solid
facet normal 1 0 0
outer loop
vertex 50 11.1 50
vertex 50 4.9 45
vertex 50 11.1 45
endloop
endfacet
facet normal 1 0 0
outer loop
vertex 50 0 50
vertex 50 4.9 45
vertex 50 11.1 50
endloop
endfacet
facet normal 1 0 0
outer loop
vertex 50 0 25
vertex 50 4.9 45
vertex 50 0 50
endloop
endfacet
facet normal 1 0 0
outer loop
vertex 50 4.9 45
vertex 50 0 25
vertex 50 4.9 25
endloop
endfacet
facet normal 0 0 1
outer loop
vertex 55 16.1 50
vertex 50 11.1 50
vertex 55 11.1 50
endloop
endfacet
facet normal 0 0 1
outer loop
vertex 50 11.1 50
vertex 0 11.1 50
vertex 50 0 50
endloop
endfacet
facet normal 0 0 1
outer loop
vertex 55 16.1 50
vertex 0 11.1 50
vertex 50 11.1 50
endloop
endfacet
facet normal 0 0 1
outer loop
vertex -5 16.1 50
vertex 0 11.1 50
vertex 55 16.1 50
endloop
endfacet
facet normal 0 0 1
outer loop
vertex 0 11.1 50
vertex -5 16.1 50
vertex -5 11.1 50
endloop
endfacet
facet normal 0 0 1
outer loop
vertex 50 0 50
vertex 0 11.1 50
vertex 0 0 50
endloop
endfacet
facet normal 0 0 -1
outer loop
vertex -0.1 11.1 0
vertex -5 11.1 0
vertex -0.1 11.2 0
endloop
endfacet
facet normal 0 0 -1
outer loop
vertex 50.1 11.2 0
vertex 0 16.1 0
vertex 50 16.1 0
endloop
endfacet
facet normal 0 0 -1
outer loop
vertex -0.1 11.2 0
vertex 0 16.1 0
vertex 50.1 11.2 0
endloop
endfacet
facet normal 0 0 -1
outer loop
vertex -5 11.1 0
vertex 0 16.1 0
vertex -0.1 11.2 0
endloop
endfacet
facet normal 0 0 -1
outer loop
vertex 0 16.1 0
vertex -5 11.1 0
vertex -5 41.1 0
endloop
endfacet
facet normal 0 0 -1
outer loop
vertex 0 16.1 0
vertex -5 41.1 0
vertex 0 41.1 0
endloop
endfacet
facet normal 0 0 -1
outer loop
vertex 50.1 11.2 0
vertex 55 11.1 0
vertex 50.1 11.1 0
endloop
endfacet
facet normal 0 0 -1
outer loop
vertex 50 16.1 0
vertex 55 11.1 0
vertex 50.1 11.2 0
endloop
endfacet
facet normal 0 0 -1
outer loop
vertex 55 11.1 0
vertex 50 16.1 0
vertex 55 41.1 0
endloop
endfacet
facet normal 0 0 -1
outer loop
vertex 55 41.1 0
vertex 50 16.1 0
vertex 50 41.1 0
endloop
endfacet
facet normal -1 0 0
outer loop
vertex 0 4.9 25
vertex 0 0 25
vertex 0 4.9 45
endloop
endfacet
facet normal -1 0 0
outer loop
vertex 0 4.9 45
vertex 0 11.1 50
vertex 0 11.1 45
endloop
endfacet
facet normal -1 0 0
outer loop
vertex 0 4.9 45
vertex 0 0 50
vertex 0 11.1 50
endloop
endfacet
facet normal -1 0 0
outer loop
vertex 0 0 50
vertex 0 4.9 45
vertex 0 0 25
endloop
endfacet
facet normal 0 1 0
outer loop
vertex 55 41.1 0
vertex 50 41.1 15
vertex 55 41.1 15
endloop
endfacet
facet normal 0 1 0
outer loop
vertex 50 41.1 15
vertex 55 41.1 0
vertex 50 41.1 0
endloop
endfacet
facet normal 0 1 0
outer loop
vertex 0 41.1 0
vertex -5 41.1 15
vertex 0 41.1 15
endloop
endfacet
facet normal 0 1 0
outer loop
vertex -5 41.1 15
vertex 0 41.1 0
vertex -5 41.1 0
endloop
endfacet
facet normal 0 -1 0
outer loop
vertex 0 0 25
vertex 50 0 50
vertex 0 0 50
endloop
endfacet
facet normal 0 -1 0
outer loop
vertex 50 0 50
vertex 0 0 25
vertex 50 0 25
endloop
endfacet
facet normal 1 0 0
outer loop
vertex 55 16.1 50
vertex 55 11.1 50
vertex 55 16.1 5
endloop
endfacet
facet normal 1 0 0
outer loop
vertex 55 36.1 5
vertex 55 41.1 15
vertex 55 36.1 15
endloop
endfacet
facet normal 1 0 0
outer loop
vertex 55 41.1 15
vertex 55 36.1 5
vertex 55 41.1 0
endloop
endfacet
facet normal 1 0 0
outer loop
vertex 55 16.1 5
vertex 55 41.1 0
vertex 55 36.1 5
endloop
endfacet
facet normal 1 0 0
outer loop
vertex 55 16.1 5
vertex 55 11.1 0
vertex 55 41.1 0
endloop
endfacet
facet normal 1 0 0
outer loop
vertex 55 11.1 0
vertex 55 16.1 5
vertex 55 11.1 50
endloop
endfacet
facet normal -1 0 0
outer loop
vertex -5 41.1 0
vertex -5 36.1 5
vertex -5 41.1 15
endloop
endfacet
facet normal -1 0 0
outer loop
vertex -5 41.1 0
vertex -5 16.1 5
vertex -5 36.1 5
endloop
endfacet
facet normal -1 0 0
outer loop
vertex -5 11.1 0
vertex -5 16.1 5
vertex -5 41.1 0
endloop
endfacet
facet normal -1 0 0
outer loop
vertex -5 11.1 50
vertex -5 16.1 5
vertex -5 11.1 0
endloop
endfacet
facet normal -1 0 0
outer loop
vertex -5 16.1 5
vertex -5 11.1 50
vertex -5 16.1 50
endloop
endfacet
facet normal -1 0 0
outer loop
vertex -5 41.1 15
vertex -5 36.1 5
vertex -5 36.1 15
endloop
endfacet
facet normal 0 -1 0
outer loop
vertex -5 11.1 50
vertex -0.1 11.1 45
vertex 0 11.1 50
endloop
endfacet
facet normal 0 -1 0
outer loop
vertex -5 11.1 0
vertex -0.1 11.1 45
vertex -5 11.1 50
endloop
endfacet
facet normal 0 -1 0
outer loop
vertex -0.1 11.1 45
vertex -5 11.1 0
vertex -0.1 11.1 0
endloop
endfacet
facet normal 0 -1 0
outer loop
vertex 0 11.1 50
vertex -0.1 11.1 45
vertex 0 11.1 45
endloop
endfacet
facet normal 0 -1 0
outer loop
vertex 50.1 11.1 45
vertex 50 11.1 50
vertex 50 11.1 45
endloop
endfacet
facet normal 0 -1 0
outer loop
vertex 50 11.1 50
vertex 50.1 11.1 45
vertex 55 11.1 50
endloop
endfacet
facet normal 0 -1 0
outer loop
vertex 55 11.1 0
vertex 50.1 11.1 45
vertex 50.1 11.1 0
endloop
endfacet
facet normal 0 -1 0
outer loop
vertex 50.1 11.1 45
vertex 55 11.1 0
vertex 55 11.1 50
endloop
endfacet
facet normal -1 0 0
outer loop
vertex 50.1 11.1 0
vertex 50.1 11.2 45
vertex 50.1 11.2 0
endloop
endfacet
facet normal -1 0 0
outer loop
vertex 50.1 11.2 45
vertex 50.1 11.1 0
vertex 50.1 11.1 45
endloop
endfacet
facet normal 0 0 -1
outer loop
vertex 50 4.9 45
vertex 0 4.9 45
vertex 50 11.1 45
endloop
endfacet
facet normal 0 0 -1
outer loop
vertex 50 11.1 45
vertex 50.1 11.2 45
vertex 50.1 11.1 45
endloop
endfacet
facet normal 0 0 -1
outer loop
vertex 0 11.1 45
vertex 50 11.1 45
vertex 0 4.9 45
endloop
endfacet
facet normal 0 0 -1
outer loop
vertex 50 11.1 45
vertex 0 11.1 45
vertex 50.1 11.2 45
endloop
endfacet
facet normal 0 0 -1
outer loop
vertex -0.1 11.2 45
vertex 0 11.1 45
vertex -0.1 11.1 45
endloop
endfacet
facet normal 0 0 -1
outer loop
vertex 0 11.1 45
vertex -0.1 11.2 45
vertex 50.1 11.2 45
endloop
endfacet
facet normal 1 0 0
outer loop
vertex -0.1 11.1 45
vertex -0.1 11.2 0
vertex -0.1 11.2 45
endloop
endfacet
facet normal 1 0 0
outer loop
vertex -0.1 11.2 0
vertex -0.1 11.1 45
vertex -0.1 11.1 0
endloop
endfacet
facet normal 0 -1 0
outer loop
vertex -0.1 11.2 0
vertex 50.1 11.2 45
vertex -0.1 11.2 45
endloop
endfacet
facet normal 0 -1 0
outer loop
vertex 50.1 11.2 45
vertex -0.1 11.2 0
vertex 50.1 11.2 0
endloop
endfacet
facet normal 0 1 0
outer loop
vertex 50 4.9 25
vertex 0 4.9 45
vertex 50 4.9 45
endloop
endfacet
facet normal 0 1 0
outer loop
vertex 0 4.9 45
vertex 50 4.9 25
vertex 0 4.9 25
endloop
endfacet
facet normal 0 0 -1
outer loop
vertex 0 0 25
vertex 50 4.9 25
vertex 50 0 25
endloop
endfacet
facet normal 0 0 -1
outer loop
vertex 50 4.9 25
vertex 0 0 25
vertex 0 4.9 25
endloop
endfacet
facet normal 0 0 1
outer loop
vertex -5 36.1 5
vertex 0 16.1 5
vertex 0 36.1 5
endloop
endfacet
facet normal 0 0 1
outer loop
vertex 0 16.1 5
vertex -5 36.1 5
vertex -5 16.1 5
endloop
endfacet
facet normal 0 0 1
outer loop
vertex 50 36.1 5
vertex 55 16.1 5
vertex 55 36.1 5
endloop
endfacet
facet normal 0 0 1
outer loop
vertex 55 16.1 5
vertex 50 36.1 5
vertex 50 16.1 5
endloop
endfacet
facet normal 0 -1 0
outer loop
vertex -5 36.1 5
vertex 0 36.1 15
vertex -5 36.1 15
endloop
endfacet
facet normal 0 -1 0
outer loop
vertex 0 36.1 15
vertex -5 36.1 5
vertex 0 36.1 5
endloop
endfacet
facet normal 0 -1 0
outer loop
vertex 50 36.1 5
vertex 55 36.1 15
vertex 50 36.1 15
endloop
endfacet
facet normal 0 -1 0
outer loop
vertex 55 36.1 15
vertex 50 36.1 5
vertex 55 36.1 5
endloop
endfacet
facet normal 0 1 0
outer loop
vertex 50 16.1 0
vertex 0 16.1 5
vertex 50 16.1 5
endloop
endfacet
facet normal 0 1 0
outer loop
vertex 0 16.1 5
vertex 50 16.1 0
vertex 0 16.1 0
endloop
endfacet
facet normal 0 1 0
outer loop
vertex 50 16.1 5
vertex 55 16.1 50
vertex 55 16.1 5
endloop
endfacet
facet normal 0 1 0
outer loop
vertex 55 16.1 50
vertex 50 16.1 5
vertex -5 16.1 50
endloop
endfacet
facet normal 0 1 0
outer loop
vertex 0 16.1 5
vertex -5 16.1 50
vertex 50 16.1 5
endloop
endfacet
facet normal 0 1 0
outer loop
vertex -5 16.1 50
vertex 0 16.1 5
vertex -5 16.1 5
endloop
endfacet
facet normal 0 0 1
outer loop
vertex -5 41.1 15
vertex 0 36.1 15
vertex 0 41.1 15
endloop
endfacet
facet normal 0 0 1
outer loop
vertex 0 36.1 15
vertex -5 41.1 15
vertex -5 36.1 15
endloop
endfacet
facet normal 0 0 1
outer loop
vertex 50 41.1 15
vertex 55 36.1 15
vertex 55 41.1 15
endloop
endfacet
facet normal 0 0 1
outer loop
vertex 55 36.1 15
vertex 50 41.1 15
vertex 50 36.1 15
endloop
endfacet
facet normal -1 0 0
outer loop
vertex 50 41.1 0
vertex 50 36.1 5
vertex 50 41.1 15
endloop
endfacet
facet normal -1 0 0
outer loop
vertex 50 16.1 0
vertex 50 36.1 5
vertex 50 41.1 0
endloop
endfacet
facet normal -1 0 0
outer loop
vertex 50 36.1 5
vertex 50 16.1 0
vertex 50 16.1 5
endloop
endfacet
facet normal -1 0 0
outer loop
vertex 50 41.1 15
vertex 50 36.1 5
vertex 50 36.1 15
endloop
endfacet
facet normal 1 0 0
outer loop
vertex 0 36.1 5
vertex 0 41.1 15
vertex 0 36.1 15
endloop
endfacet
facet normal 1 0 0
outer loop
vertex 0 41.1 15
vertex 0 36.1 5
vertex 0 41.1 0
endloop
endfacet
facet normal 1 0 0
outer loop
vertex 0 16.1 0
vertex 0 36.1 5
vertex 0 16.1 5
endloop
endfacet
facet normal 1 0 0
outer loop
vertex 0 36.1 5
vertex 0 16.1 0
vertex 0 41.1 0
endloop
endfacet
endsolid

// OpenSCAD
// Render Precision
$fn=50;

/*
 Dimensions Definitions
*/
total_height = 50;
hook_strength = 5;
handle_width = 50;
holder_hook_depth = 20;
holder_hook_height = 10;
holder_hook_width = handle_width+2*hook_strength;
glass_thickness = 6+0.1;
glass_hook_width = 50;
glass_hook_height= total_height/2;

difference(){
	union(){
		cube([glass_hook_width, 3*hook_strength+glass_thickness+holder_hook_depth, total_height]);
		translate([-(holder_hook_width-glass_hook_width)/2, hook_strength+glass_thickness, 0])
			cube([holder_hook_width, 2*hook_strength+holder_hook_depth, total_height]);
	}
	// Form the Glass Hook
	translate([-0.1,hook_strength-0.1,-hook_strength])
		cube([glass_hook_width+0.2, glass_thickness+0.2, total_height]);
	translate([-0.1, -0.1, -0.1])
		cube([glass_hook_width+0.2, hook_strength+0.2, glass_hook_height+0.1]);

	// Form the Squeegee Hook
	translate([-0.1-(holder_hook_width-glass_hook_width)/2, 2*hook_strength+glass_thickness, hook_strength])
		cube([holder_hook_width+0.2, holder_hook_depth, total_height]);
	translate([-0.1-(holder_hook_width-glass_hook_width)/2, 2*hook_strength+glass_thickness+holder_hook_depth-0.1,hook_strength+holder_hook_height]) 
		cube([holder_hook_width+0.2, hook_strength+0.2, total_height]);
	translate([-(handle_width-glass_hook_width)/2, 2*hook_strength+glass_thickness, -0.1])
		cube([handle_width, holder_hook_depth+hook_strength+0.1, holder_hook_height+hook_strength+0.2]);
}

	
